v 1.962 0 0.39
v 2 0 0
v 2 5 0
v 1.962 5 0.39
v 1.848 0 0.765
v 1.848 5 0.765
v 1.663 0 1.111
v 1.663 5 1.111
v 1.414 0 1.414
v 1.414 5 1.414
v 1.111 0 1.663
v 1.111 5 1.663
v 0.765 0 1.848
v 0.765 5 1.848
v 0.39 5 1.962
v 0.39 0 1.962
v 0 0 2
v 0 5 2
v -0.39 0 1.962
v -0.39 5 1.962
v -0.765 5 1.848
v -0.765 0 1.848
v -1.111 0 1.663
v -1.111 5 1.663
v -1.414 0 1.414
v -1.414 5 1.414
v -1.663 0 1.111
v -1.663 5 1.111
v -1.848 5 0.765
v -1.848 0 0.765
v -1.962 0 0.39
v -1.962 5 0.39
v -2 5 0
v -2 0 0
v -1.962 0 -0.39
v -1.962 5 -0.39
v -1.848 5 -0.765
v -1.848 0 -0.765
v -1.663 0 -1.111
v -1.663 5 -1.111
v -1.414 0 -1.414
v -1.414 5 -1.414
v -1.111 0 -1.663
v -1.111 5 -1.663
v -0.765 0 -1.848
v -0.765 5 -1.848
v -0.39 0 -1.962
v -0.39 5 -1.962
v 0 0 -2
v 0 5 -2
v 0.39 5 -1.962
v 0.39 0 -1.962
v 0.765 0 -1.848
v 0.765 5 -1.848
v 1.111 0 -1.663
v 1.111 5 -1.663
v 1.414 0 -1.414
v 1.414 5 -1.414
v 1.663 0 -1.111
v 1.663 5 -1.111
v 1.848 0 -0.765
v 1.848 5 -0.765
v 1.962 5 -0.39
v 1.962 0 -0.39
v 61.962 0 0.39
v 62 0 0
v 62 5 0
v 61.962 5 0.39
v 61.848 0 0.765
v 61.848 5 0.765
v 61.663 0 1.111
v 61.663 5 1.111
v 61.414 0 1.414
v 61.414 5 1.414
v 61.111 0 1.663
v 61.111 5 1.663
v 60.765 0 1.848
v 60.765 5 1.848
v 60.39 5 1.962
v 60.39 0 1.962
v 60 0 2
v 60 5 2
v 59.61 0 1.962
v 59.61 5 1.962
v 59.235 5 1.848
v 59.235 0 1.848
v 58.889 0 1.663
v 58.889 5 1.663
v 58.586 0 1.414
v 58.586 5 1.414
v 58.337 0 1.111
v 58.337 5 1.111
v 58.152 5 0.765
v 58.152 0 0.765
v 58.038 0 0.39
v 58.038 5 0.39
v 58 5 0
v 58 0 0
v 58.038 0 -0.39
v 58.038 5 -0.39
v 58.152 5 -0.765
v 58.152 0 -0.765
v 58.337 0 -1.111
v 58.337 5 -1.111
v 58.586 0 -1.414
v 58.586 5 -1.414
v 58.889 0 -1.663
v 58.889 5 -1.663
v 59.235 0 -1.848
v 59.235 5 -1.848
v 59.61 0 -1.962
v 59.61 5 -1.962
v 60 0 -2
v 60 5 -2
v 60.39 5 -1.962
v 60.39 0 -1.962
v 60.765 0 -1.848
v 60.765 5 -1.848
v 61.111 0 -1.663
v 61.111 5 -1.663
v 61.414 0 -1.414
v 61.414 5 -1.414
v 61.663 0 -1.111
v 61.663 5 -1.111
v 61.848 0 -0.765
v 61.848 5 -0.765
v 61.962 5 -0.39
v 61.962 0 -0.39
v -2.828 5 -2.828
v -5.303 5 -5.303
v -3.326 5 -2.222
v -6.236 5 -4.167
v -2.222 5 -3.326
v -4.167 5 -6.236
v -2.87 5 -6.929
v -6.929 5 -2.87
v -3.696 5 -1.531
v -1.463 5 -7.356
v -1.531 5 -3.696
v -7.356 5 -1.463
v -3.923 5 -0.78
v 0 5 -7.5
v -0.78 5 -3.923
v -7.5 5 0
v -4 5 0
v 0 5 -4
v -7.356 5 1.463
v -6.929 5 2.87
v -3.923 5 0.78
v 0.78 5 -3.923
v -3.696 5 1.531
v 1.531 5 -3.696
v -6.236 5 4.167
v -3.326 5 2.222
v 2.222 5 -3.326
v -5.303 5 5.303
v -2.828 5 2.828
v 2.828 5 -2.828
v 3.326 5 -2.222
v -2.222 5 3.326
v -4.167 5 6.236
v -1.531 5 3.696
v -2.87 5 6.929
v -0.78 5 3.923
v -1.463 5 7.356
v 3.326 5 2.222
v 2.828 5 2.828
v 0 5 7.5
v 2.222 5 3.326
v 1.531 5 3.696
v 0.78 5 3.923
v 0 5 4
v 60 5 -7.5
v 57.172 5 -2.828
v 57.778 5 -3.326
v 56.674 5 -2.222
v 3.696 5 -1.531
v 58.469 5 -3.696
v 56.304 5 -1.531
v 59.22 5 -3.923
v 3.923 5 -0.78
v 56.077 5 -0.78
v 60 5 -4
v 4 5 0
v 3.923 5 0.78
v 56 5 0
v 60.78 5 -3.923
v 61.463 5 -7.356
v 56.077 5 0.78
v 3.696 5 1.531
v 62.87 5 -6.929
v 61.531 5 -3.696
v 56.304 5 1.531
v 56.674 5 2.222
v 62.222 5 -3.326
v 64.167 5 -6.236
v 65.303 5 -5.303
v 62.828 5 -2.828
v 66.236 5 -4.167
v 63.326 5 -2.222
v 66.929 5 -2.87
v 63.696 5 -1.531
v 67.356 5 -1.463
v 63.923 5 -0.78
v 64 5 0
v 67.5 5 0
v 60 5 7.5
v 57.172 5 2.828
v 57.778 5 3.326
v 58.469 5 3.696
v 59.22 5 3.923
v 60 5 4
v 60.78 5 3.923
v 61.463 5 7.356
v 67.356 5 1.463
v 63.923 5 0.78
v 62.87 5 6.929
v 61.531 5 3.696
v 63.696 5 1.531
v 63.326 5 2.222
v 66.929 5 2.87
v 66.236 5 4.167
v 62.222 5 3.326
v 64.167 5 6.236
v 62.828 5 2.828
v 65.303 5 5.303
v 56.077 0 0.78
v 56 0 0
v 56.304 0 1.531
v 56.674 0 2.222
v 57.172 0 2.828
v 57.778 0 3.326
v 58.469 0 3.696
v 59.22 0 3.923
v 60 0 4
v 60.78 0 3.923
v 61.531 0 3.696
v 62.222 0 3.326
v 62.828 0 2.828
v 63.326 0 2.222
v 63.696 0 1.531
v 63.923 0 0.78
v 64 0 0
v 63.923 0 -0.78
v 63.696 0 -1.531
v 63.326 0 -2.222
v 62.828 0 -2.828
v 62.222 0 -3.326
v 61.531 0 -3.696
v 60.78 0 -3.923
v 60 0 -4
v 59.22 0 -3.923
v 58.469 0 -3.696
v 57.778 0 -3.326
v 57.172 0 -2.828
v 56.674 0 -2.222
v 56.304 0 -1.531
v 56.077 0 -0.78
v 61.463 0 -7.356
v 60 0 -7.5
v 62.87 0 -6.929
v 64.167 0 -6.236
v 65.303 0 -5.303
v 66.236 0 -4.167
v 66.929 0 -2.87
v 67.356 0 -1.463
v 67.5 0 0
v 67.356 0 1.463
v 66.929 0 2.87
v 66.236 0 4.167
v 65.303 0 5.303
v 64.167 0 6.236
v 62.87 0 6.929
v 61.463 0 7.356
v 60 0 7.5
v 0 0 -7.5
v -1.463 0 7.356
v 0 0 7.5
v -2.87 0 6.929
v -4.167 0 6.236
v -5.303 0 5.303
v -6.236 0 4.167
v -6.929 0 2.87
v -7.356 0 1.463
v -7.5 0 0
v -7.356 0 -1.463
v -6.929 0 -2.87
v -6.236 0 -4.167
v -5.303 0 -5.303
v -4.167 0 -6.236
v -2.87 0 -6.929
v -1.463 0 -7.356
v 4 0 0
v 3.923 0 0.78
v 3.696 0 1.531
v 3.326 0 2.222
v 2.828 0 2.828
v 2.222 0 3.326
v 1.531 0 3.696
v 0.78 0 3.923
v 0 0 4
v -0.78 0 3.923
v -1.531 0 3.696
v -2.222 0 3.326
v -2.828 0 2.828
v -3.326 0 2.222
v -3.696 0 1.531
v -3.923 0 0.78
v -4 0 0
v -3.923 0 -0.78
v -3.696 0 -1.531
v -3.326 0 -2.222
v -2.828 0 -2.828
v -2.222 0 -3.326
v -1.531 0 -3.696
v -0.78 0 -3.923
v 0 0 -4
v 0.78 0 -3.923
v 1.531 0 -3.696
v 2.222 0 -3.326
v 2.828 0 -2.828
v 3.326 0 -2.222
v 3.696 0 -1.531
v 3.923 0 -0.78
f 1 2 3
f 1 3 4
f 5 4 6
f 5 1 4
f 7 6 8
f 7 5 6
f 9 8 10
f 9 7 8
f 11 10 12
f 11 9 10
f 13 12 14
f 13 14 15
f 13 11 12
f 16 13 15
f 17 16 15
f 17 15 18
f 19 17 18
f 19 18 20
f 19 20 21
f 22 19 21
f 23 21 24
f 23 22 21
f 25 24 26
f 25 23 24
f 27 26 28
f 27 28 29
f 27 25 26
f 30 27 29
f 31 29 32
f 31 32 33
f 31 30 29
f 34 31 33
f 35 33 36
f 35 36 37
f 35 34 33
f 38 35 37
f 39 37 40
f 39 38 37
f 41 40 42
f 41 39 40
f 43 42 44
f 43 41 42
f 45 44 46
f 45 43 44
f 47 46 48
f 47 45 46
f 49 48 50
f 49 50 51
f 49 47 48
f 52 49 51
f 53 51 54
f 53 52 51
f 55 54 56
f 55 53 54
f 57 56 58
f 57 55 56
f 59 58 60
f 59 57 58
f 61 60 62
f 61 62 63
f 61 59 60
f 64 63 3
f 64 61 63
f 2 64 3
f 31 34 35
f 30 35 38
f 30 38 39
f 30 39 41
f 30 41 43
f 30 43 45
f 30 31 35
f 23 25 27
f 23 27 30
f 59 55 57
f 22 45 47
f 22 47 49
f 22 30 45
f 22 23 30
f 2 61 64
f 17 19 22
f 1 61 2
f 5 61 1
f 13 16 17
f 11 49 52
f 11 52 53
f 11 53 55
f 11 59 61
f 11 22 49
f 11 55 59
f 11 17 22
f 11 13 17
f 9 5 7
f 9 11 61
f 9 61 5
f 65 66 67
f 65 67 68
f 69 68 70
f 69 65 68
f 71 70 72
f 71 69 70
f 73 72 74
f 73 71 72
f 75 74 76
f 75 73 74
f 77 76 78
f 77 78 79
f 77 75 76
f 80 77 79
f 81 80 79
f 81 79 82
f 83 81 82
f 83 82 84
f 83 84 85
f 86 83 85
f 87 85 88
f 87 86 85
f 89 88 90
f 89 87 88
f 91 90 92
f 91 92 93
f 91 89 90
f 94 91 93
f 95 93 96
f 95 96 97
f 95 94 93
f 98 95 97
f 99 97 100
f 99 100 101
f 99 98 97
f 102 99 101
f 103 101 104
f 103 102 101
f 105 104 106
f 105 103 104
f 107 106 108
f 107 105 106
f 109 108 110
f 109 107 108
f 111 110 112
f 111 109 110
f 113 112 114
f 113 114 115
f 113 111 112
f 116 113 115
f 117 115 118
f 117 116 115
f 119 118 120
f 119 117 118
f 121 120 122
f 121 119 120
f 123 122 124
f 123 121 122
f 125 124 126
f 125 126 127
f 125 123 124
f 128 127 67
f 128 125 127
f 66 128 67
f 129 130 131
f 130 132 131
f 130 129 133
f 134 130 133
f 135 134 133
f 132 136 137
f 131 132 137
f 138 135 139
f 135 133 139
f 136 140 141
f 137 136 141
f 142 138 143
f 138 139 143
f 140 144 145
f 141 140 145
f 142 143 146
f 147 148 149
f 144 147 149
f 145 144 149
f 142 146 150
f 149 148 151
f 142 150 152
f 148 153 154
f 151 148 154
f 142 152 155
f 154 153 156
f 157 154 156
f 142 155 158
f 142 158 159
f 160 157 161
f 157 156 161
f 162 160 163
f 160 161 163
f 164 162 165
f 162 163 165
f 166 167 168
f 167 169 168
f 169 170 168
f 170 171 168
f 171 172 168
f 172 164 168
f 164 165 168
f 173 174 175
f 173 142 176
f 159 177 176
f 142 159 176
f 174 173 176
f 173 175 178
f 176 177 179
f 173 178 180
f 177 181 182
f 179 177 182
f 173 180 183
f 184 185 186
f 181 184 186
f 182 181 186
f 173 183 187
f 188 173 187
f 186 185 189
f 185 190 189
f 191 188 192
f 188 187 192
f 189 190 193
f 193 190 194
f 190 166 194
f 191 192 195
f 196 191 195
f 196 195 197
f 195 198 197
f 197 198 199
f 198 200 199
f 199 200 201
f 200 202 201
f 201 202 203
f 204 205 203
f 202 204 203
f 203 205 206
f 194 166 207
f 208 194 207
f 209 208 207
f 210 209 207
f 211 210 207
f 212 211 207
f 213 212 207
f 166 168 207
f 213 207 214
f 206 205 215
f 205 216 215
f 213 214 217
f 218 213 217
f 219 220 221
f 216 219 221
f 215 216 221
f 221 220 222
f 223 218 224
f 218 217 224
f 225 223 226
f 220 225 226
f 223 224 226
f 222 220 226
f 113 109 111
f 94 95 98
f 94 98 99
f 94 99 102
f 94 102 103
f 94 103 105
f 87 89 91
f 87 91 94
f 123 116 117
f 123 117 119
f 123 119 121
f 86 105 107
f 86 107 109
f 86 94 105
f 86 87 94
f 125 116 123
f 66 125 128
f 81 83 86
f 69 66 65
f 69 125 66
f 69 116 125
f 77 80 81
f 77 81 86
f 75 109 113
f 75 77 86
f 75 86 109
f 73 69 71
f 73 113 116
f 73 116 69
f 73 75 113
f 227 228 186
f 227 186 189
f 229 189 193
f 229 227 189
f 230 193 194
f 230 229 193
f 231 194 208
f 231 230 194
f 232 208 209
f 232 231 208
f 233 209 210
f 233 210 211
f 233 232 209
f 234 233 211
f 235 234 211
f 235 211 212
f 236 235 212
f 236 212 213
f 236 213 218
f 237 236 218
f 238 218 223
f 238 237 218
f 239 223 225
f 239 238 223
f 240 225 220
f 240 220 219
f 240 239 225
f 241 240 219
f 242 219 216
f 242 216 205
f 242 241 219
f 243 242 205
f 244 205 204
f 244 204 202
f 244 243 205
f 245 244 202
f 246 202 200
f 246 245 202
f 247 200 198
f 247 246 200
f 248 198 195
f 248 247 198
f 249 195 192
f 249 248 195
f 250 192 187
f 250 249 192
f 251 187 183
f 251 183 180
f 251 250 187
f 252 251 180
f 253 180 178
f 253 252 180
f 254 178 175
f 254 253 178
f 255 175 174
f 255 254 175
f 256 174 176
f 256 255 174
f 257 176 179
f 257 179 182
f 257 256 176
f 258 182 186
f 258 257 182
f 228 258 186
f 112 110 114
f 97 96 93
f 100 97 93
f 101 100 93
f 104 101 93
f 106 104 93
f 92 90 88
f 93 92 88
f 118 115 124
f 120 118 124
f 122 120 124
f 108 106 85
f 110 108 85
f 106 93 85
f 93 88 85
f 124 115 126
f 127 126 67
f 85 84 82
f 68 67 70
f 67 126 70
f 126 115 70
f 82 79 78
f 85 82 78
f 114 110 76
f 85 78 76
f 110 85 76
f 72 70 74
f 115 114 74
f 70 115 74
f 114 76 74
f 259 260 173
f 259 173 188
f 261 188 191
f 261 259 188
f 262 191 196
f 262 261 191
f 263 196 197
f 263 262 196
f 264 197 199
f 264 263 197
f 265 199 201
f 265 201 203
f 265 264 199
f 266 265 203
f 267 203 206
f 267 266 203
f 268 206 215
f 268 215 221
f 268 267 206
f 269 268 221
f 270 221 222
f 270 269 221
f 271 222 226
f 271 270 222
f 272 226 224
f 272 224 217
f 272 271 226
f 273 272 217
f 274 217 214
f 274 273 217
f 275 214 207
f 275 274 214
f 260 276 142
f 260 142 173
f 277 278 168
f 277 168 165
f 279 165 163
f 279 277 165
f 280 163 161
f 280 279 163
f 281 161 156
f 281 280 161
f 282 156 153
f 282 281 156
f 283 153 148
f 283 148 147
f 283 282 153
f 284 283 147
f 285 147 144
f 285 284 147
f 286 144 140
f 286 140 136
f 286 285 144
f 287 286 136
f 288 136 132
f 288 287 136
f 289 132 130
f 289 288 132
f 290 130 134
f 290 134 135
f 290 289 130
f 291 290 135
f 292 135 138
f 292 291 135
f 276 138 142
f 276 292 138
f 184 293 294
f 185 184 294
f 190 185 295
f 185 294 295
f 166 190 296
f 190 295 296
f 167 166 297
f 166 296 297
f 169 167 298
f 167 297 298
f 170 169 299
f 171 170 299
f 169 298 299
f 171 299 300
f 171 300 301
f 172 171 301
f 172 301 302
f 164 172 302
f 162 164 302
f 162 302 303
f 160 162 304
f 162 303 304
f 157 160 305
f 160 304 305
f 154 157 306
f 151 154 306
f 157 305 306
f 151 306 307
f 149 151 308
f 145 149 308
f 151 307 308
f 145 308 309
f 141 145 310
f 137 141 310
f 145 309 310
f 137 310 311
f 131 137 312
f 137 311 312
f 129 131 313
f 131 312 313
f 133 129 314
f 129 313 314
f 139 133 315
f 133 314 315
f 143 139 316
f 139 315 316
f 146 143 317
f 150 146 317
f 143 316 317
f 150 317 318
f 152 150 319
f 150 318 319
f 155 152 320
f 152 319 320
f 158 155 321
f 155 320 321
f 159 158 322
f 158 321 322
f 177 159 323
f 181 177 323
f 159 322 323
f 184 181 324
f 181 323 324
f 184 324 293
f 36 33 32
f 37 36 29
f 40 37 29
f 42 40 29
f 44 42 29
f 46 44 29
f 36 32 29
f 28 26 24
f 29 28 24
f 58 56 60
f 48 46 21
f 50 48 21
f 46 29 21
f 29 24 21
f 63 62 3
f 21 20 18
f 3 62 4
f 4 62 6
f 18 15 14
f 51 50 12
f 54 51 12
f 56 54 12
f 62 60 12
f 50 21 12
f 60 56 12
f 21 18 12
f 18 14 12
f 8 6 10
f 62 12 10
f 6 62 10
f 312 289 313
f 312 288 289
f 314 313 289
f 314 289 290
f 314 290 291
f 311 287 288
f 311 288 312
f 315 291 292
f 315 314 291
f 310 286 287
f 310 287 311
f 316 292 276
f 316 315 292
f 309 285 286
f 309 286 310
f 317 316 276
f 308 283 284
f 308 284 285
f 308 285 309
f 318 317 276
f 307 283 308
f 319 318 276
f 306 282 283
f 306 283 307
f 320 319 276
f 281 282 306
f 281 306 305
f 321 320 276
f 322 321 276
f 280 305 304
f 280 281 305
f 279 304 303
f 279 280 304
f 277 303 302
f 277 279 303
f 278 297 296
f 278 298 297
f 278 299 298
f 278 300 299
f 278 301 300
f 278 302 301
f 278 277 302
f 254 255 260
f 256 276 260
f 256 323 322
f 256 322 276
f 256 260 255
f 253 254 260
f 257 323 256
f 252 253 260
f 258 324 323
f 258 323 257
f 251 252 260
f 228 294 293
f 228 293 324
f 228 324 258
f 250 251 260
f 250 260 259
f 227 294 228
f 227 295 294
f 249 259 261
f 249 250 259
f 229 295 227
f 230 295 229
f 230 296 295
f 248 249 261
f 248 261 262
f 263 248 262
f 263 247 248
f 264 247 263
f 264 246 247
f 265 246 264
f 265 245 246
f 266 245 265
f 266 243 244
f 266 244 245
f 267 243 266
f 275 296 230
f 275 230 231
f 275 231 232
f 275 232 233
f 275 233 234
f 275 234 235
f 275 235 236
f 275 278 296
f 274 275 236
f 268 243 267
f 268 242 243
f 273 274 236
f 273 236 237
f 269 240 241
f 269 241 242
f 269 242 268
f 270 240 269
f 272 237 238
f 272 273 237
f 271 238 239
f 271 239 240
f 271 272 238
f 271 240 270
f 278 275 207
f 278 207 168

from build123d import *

# Parameters (mm, degrees)
F0_R     = 4
F1_DEPTH = 5
F2_R     = 2
F3_DEPTH = 5


with BuildPart() as f1:
    # F0 (on Front) → F1 (new body)
    with BuildSketch(Plane.XZ):
        with BuildLine():
            Line((60, 7.5), (0, 7.5))
            ThreePointArc((0, 7.5), (-7.5, 0), (0, -7.5))
            Line((0, -7.5), (60, -7.5))
            ThreePointArc((60, -7.5), (67.5, 0), (60, 7.5))
        make_face()
        Circle(F0_R, mode=Mode.SUBTRACT)
        with BuildLine():
            ThreePointArc((64, 0), (60, -4), (56, 0))
            ThreePointArc((56, 0), (60, 4), (64, 0))
        make_face(mode=Mode.SUBTRACT)
    extrude(amount=-F1_DEPTH)


with BuildPart() as f3:
    # F2 (on face) → F3 (new body)
    with BuildSketch(Plane.XZ):
        Circle(F2_R)
        with Locations((60, 0)):
            Circle(F2_R)
    extrude(amount=-F3_DEPTH)


solid = Compound([f1.part, f3.part])
